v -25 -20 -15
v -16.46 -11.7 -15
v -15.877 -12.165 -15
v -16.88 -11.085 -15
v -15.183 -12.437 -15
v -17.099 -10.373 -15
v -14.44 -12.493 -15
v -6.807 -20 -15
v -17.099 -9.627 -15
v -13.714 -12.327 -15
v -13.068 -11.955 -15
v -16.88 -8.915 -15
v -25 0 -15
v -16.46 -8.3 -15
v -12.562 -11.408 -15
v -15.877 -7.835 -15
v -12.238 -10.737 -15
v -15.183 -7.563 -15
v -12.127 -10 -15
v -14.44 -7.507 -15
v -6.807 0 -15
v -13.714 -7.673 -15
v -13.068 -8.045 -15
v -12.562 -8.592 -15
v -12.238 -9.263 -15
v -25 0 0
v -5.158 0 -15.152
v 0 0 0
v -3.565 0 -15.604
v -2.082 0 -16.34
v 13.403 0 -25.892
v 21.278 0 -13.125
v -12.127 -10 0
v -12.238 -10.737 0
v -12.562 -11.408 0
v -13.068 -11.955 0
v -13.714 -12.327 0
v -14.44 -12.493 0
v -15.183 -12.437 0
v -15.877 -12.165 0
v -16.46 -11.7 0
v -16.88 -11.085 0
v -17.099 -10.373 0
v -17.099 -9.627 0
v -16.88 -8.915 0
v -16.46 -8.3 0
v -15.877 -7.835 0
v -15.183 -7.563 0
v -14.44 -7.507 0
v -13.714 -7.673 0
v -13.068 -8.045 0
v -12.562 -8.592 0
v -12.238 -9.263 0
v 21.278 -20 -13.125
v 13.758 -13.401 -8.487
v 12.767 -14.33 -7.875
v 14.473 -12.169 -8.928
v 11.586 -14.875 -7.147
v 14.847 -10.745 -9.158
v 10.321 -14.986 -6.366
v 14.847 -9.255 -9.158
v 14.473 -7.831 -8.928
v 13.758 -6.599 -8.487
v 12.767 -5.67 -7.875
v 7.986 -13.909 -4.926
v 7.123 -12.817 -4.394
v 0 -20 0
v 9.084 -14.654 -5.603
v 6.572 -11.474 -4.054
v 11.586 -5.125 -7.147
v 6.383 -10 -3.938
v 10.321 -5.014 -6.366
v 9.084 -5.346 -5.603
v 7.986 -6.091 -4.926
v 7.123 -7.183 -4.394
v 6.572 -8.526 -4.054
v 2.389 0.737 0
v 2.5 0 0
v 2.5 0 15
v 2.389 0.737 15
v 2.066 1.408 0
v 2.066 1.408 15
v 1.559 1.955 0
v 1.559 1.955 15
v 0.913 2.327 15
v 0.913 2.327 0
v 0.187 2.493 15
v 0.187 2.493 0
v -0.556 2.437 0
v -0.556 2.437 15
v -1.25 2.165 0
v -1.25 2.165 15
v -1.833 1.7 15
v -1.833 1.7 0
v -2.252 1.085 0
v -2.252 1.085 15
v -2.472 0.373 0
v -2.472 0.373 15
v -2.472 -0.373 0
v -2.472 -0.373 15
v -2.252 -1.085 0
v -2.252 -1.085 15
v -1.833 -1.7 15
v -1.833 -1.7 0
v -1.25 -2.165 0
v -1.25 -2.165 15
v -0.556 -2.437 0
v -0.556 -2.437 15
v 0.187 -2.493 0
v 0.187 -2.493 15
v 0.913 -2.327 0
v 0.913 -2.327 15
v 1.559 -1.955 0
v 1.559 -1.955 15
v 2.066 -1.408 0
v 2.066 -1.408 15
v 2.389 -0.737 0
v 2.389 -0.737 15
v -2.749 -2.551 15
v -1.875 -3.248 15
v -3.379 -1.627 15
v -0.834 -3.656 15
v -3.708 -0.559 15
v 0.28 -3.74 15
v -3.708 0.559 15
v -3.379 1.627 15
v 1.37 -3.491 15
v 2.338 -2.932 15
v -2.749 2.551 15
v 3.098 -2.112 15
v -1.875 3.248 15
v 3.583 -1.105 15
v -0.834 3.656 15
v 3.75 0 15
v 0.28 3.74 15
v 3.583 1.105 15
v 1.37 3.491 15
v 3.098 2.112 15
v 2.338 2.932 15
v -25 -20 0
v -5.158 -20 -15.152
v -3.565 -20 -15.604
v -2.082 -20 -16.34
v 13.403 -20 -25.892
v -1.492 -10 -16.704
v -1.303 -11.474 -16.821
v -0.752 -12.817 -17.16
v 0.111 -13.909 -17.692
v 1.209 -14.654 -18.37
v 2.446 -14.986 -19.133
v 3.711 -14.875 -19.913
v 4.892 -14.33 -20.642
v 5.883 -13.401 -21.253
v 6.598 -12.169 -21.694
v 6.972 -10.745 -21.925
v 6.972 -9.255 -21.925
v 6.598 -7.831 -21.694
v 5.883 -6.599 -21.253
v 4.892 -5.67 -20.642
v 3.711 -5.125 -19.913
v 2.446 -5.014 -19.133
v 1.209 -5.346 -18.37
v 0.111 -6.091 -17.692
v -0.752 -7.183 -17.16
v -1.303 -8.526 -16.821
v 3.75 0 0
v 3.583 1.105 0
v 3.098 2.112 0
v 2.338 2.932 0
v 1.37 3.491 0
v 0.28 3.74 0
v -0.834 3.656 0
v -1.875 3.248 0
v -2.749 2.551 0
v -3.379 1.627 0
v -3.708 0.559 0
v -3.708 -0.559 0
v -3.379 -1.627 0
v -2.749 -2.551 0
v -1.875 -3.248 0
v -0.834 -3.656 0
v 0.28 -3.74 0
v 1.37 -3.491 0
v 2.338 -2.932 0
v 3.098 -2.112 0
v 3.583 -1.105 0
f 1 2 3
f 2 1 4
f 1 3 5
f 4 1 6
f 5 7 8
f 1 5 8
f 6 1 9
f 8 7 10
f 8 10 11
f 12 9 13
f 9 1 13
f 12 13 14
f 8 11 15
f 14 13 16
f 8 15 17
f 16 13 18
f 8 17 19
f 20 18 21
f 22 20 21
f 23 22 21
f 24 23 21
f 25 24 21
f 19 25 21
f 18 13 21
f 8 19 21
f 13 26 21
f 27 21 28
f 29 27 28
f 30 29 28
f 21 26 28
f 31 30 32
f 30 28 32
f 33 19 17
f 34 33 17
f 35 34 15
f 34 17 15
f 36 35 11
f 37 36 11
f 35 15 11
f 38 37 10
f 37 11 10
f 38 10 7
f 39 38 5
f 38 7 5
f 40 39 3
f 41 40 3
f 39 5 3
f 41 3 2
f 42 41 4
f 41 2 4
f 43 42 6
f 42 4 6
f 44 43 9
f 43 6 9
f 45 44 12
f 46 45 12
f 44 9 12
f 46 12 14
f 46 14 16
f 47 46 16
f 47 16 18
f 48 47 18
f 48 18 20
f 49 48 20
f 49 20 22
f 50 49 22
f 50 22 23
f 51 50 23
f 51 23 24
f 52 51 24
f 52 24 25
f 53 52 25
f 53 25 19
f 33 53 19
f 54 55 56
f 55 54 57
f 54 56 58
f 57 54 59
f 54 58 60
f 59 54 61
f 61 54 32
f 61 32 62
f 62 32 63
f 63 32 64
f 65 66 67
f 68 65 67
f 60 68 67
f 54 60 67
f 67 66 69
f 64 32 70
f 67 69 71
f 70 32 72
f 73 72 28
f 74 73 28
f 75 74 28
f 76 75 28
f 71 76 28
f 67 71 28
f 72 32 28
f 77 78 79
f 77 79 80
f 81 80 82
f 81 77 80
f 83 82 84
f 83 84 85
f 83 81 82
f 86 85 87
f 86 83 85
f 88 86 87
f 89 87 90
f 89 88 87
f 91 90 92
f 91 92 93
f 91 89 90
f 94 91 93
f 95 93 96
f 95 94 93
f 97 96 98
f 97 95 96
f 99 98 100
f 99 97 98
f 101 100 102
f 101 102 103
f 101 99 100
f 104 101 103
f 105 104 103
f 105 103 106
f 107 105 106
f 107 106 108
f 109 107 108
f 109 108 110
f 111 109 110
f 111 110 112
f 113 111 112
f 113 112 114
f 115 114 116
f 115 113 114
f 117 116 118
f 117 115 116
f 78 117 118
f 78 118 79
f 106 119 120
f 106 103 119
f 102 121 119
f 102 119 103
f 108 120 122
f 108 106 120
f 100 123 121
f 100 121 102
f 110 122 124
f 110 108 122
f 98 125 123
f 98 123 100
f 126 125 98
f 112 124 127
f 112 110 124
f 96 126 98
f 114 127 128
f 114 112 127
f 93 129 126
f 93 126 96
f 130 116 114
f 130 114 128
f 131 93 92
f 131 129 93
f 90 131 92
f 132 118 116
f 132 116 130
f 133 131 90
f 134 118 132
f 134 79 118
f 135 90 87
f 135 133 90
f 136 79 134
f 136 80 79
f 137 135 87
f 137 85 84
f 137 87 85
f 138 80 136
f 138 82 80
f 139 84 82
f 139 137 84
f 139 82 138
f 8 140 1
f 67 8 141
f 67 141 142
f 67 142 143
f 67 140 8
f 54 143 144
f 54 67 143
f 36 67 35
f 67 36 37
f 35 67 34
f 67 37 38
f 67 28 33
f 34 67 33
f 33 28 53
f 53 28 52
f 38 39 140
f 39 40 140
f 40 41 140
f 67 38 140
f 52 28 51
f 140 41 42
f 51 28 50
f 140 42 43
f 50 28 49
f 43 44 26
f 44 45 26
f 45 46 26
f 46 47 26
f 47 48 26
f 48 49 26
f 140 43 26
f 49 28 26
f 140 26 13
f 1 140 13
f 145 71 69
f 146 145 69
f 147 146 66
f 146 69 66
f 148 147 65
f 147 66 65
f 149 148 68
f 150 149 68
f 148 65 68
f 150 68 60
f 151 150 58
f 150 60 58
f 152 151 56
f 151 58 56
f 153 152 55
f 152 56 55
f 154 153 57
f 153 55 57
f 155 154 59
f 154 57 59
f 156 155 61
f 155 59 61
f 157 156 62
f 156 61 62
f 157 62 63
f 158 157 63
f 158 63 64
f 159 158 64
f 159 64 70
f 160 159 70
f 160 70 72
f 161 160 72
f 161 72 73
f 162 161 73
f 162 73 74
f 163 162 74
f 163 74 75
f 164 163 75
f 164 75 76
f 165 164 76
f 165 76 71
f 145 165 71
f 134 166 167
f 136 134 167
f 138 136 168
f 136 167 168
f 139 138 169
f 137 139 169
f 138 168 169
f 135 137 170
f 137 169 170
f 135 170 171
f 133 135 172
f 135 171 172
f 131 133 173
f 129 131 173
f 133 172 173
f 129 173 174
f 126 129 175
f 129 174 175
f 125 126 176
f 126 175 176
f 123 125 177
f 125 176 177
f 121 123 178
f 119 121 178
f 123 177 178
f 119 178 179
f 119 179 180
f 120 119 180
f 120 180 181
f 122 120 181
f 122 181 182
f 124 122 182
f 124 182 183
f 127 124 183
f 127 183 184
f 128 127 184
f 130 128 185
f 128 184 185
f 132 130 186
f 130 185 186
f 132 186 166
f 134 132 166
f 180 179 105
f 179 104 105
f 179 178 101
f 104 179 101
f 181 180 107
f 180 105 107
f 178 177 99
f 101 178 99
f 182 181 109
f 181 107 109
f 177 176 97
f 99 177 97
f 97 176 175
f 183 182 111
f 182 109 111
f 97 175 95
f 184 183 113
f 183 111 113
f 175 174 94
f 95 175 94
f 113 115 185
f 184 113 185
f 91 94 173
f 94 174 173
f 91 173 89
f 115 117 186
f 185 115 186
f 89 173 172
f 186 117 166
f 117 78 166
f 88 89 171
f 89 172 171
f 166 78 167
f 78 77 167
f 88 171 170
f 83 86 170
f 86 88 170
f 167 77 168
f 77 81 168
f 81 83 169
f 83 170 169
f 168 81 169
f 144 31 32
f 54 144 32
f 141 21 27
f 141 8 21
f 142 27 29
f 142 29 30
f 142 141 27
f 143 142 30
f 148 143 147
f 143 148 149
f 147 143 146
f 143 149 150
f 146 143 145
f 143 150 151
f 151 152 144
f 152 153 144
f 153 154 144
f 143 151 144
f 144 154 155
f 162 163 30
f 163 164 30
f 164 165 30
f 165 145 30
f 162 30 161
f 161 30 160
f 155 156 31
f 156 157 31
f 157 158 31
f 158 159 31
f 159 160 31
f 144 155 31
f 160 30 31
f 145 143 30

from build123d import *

# Parameters (mm, degrees)
PAD_DEPTH       = 20
SKETCH001_R     = 5
POCKET_DEPTH    = 35.1623417232
SKETCH002_R     = 2.5
POCKET001_DEPTH = 15.001
FILLET_R        = 9
SKETCH003_R     = 3.75
SKETCH003_R_2   = 2.5
PAD001_DEPTH    = 15


with BuildPart() as body:
    # Sketch → Pad (new body)
    with BuildSketch(Plane.XZ):
        Polygon((0, 0), (-25, 0), (-25, -15), (-4.2542220992, -15), (13.4025556632, -25.8915333979), (21.2775556632, -13.125), align=None)
    extrude(amount=PAD_DEPTH)

    # Sketch001 (on Face6 of Pad) → Pocket (cut, through all)
    with BuildSketch(Plane(origin=(0, 0, 0), x_dir=(-0.8511022265, 0, 0.525), z_dir=(0.525, 0, 0.8511022265))):
        with Locations((-12.5, 10)):
            Circle(SKETCH001_R)
    extrude(amount=-POCKET_DEPTH, mode=Mode.SUBTRACT)

    # Sketch002 (on Face8 of Pocket) → Pocket001 (cut, through all)
    with BuildSketch(Plane(origin=(0, 0, -15), x_dir=(1, 0, 0), z_dir=(0, 0, -1))):
        with Locations((-14.6271110496, 10)):
            Circle(SKETCH002_R)
    extrude(amount=-POCKET001_DEPTH, mode=Mode.SUBTRACT)

    # Fillet
    fillet_edges = [body.edges().sort_by_distance(p)[0] for p in [
        (-4.254222, -10, -15),
    ]]
    fillet(fillet_edges, radius=FILLET_R)


with BuildPart() as spacer:
    # Sketch003 → Pad001 (new body)
    with BuildSketch(Plane.XY):
        Circle(SKETCH003_R)
        Circle(SKETCH003_R_2, mode=Mode.SUBTRACT)
    extrude(amount=PAD001_DEPTH)


solid = Compound([body.part, spacer.part])
